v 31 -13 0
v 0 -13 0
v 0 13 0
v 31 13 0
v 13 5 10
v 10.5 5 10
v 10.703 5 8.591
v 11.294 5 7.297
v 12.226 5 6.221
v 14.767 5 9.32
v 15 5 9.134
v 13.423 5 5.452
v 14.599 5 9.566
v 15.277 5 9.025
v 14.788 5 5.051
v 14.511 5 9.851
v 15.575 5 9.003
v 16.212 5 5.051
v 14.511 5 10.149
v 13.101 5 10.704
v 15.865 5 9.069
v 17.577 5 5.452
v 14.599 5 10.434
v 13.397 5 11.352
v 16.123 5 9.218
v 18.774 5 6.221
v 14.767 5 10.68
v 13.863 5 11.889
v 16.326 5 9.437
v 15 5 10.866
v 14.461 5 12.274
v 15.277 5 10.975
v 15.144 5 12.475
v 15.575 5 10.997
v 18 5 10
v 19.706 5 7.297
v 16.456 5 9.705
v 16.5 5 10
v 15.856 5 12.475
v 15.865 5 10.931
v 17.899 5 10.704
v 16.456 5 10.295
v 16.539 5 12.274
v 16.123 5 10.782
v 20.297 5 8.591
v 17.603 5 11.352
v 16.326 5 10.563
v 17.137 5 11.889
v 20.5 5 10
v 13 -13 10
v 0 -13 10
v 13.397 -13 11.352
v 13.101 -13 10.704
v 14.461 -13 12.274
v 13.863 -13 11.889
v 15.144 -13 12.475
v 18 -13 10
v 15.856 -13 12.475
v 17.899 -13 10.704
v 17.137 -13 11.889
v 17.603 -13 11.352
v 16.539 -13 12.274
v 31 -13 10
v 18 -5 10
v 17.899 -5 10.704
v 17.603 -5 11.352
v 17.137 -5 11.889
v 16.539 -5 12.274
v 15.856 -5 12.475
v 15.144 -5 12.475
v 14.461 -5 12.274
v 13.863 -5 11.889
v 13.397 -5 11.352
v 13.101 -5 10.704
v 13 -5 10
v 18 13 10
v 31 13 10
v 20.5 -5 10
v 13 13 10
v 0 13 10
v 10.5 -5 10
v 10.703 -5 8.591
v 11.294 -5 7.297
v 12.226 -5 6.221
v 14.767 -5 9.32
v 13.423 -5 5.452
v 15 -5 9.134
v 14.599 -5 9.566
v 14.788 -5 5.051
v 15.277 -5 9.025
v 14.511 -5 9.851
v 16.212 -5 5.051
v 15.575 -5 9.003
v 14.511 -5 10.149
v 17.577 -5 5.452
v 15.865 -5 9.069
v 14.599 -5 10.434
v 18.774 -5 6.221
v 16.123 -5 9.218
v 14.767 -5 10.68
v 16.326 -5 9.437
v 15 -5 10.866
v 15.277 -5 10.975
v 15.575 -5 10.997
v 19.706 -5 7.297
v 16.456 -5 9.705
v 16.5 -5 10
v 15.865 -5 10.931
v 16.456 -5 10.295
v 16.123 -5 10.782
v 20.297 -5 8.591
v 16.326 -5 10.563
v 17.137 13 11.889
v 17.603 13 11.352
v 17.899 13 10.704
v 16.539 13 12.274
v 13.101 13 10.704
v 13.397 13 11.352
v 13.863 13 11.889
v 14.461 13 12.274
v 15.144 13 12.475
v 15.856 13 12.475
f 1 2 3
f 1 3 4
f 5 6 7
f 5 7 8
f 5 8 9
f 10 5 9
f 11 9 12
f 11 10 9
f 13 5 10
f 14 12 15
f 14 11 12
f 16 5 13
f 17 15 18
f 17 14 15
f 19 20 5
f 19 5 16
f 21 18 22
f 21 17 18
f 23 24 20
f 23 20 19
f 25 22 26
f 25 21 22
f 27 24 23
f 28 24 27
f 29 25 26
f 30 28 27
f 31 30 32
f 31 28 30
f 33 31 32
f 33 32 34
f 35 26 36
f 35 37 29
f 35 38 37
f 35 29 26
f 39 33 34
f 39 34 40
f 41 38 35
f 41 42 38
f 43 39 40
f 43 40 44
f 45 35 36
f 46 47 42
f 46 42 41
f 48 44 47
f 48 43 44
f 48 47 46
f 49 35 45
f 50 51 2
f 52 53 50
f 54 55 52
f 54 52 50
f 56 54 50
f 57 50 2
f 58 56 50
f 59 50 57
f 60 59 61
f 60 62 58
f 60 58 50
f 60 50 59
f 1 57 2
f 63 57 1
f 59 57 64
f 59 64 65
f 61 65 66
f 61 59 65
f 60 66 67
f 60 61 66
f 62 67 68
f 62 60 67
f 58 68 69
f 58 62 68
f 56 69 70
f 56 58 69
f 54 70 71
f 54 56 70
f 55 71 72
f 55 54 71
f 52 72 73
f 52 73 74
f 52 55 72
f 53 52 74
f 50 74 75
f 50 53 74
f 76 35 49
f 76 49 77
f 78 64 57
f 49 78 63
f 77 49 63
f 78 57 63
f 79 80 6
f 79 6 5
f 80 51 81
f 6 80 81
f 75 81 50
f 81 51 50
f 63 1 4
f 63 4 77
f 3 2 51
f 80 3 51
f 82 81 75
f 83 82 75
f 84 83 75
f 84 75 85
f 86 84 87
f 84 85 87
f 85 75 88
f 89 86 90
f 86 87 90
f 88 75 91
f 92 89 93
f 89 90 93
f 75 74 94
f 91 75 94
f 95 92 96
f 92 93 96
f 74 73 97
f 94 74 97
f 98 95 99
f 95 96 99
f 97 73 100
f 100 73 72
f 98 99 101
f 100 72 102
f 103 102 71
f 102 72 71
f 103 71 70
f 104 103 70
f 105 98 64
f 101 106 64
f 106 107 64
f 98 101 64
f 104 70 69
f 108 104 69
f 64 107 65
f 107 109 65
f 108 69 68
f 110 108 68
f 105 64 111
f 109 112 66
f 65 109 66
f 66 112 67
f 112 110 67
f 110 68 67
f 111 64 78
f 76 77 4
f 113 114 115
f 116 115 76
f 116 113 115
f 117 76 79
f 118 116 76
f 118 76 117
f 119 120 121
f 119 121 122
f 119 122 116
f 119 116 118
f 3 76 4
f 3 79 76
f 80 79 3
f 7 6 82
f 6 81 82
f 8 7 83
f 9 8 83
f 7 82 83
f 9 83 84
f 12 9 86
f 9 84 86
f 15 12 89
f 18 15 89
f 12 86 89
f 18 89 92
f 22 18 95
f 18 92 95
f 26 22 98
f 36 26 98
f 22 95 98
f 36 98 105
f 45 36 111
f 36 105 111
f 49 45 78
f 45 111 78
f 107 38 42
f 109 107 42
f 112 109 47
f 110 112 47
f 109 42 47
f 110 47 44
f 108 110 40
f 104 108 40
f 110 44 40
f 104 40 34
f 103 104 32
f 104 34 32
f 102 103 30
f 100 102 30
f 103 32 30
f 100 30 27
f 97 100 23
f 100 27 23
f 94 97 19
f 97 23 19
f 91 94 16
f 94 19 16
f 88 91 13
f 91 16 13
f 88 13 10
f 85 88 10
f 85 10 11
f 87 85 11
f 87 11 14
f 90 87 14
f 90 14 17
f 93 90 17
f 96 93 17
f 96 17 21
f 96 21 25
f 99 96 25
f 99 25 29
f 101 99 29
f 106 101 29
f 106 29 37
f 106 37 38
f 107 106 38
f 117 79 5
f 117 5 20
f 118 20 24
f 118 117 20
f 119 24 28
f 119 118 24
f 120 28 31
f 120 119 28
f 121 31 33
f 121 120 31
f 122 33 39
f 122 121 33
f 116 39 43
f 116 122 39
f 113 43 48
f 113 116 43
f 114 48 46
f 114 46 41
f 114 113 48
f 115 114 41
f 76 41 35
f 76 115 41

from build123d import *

# Parameters (mm, degrees)
F0_W     = 31
F0_H     = 10
F1_DEPTH = 13
F2_R     = 1
F3_DEPTH = 20
F4_R     = 2.5
F5_DEPTH = 10
F6_R     = 2.5
F7_DEPTH = 10
F8_R     = 5
F8_R_2   = 1
F9_DEPTH = 5


with BuildPart() as f1:
    # F0 (on Front) → F1 (new body, symmetric)
    with BuildSketch(Plane.XZ):
        with Locations((15.5, 5)):
            Rectangle(F0_W, F0_H)
    extrude(amount=F1_DEPTH, both=True)

    # F2 (on face) → F3 (join)
    with BuildSketch(Plane.XZ.offset(13)):
        with Locations((15.5, 10)):
            Circle(F2_R)
    extrude(amount=-F3_DEPTH)

    # F4 (on face) → F5 (join)
    with BuildSketch(Plane.XZ.offset(13)):
        with Locations((15.5, 10)):
            Circle(F4_R)
    extrude(amount=-F5_DEPTH)

    # F6 (on face) → F7 (join)
    with BuildSketch(Plane(origin=(0, 13, 0), x_dir=(-1, 0, 0), z_dir=(0, 1, 0))):
        with Locations((-15.5, 10)):
            Circle(F6_R)
    extrude(amount=-F7_DEPTH)

    # F8 (on Front) → F9 (cut, symmetric)
    with BuildSketch(Plane.XZ):
        with Locations((15.5, 10)):
            Circle(F8_R)
        with Locations((15.5, 10)):
            Circle(F8_R_2, mode=Mode.SUBTRACT)
    extrude(amount=F9_DEPTH, both=True, mode=Mode.SUBTRACT)


solid = f1.part
